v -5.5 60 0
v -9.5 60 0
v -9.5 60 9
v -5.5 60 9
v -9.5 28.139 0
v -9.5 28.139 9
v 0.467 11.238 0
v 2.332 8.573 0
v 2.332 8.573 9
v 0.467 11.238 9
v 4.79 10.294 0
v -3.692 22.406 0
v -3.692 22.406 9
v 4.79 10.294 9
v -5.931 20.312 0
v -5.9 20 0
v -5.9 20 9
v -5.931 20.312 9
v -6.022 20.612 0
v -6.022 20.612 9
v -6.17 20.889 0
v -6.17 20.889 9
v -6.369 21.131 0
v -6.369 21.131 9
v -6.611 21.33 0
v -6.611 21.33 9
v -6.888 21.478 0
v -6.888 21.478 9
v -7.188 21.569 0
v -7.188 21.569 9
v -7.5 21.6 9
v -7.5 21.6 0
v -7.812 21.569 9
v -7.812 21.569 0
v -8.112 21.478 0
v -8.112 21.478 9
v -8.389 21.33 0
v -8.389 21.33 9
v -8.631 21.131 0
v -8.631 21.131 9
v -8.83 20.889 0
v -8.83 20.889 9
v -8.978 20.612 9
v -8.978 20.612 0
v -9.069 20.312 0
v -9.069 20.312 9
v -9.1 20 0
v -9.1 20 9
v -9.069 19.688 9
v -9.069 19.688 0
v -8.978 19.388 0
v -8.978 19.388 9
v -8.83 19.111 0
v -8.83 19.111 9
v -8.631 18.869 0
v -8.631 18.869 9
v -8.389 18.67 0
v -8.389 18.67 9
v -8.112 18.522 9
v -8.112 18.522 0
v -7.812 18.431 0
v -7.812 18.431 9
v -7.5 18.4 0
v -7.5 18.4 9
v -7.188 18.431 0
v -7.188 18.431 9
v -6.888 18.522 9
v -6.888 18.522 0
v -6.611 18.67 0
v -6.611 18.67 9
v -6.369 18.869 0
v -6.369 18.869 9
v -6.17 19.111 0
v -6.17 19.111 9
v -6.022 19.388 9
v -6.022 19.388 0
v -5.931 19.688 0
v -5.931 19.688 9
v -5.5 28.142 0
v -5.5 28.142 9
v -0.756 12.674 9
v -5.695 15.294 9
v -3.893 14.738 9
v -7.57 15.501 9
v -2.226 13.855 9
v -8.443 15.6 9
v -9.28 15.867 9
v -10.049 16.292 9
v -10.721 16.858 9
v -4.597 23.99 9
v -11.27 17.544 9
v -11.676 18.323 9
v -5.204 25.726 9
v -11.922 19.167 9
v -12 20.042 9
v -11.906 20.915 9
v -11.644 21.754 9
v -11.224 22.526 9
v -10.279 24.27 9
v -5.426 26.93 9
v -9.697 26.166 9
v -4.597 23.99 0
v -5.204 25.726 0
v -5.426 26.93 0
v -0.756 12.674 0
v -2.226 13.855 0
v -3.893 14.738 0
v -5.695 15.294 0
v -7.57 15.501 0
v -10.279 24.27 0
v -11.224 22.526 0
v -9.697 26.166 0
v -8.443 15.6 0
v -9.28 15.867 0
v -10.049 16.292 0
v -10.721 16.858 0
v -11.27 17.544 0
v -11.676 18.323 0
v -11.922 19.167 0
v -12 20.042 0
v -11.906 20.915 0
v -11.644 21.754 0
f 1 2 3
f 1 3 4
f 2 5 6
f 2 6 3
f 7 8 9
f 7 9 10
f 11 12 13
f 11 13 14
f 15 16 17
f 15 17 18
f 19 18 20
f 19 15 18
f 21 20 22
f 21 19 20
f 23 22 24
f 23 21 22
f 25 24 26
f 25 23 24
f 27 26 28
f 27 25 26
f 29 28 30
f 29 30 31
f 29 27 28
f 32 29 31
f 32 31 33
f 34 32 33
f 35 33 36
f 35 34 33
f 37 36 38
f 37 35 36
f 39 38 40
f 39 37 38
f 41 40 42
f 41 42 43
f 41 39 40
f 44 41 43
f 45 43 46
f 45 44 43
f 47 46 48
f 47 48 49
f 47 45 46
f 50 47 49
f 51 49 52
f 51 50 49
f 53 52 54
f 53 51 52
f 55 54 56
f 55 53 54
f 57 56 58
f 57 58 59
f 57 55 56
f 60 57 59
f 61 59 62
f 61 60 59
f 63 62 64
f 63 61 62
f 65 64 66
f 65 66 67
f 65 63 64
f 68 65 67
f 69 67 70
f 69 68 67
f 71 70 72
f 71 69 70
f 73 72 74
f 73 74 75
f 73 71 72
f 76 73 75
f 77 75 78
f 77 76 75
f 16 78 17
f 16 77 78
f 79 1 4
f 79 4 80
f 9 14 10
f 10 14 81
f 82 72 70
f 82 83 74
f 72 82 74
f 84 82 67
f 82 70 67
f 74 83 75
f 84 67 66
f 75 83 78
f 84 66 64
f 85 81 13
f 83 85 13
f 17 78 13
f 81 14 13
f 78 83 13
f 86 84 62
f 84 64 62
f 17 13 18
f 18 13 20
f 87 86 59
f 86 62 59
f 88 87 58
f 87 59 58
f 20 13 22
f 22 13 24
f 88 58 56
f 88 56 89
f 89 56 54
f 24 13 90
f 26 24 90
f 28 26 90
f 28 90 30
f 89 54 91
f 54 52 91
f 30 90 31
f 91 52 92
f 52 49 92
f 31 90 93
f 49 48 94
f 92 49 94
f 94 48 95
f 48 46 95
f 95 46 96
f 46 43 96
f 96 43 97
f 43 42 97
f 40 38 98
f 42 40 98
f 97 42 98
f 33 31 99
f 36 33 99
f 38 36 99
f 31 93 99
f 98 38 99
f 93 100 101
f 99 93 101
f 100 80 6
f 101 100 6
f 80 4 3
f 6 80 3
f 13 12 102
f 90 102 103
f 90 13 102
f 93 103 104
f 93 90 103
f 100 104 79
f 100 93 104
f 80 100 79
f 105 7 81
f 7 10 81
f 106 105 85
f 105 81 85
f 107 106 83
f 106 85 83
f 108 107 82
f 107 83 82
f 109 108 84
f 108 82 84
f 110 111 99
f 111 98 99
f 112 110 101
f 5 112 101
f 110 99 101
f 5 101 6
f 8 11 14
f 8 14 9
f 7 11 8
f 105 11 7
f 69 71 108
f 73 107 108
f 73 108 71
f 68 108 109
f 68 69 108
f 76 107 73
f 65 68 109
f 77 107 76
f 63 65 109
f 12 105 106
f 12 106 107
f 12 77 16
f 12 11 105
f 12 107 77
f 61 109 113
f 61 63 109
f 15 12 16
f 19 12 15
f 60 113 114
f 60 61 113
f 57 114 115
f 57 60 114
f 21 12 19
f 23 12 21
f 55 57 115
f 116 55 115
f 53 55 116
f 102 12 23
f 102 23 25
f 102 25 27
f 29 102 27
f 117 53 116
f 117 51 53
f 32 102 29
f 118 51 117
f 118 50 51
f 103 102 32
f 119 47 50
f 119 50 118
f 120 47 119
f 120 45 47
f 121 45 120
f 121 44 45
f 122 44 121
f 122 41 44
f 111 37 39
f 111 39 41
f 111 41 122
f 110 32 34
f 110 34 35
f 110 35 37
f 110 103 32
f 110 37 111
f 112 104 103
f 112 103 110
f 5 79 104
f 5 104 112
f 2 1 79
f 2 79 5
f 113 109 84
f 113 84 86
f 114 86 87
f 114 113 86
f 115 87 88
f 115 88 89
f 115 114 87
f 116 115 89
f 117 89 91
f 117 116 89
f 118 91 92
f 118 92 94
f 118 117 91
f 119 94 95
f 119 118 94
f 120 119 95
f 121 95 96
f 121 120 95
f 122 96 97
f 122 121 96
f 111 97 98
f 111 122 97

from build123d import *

# Parameters (mm, degrees)
SKETCH1_R           = 1.6
BOSS_EXTRUDE1_DEPTH = 9
FILLET1_R           = 10


with BuildPart() as part:
    # Sketch1 → Boss-Extrude1 (new body)
    with BuildSketch(Plane.XY):
        with BuildLine():
            Line((-3.813815801, 22.581093964), (4.789830745, 10.293813299))
            Line((4.789830745, 10.293813299), (2.332374612, 8.57308399))
            Line((2.332374612, 8.57308399), (-3.837793208, 17.384996862))
            ThreePointArc((-3.837793208, 17.384996862), (-10.92541976, 17.081695789), (-9.5, 24.031128874))
            Line((-9.5, 24.031128874), (-9.5, 60))
            Line((-9.5, 60), (-5.5, 60))
            Line((-5.5, 60), (-5.5, 24.031128874))
            ThreePointArc((-5.5, 24.031128874), (-4.565920417, 23.41191691), (-3.813815801, 22.581093964))
        make_face()
        with Locations((-7.5, 20)):
            Circle(SKETCH1_R, mode=Mode.SUBTRACT)
    extrude(amount=BOSS_EXTRUDE1_DEPTH)

    # Fillet1
    fillet1_edges = [part.edges().sort_by_distance(p)[0] for p in [
        (-3.837793208, 17.384996862, 4.5),
        (-9.5, 24.031128874, 4.5),
        (-5.5, 24.031128874, 4.5),
    ]]
    fillet(fillet1_edges, radius=FILLET1_R)


solid = part.part
